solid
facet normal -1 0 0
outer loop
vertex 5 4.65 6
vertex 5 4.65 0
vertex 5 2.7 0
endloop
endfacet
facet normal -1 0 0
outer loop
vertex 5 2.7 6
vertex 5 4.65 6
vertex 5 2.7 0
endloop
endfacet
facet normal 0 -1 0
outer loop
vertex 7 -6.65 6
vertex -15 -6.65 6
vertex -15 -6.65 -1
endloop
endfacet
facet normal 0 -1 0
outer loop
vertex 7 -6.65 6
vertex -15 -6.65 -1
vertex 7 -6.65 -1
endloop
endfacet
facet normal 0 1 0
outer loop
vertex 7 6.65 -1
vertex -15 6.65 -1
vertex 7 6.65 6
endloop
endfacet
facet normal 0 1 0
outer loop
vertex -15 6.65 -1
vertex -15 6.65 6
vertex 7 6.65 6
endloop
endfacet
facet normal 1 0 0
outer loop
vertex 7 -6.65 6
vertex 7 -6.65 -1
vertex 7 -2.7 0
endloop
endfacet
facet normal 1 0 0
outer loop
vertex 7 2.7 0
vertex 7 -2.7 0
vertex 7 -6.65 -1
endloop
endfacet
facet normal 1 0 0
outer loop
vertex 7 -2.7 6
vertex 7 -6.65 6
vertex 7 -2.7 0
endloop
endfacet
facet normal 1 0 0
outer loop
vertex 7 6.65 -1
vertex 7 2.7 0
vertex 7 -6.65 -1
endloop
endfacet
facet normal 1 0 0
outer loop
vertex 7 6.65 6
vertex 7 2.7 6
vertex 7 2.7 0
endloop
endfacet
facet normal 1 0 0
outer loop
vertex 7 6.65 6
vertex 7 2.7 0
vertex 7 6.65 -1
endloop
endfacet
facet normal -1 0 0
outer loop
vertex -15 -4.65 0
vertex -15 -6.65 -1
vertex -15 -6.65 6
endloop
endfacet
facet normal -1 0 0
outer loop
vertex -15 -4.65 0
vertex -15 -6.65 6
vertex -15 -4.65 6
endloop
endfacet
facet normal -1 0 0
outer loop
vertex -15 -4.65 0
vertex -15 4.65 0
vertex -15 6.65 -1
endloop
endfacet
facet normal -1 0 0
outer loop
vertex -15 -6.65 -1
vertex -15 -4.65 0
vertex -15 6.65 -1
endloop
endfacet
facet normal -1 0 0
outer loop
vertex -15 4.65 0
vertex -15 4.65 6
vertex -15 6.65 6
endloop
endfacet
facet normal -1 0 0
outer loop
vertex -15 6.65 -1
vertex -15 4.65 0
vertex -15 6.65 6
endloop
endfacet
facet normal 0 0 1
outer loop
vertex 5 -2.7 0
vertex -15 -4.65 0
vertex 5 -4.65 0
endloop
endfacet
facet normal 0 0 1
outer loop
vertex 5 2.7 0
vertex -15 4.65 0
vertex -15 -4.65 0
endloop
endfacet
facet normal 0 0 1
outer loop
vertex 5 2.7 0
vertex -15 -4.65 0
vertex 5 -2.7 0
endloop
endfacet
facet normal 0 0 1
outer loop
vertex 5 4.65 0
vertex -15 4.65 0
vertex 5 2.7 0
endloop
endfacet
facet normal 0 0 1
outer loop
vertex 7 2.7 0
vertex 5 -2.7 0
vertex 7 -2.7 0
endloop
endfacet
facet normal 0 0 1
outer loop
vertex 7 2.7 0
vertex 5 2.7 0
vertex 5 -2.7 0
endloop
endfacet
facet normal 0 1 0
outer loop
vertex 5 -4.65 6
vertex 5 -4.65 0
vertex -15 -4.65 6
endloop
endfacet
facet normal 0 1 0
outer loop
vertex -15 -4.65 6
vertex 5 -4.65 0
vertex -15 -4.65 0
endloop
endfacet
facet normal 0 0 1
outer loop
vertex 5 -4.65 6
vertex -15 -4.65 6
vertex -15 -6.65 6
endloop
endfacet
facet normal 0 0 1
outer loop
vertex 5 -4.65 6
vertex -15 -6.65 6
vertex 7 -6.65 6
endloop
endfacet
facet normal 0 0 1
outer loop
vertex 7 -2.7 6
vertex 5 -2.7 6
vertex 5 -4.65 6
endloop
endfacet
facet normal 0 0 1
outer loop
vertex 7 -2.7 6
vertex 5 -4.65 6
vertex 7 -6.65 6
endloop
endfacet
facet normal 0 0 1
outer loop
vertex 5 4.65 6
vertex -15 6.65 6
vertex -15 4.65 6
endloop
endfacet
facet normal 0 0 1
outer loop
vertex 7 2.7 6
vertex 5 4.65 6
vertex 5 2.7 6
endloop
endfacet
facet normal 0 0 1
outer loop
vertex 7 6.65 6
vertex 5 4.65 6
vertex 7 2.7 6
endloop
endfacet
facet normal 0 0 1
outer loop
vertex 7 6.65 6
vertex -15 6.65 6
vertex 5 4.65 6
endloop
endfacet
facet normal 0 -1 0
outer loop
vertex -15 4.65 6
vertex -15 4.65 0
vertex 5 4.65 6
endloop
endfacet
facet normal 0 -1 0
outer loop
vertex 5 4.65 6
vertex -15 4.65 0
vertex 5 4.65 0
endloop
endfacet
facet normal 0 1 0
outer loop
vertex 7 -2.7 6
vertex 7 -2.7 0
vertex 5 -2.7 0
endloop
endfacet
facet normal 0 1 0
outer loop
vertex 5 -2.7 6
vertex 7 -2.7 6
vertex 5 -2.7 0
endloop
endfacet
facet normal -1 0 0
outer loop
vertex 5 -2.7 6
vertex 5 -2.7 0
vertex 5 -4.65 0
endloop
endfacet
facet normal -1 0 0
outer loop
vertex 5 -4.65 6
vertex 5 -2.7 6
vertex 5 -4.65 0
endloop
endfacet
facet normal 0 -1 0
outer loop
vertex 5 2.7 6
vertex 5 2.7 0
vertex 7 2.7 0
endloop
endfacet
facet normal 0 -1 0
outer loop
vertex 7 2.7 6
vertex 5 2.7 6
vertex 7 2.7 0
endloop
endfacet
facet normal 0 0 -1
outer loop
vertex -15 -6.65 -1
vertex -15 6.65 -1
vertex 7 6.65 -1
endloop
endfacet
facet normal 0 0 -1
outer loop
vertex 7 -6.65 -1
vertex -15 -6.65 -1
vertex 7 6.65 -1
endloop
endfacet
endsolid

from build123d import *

# Parameters (mm, degrees)
F0_W     = 10
F0_H     = 2
F1_DEPTH = 6
F2_W     = 22
F2_H     = 13.3
F3_DEPTH = 1


with BuildPart() as f1:
    # F0 (on Top) → F1 (new body)
    with BuildSketch(Plane.XY):
        Polygon((-5, 4.65), (5, 4.65), (5, 2.7), (7, 2.7), (7, 4.85), (7, 6.65), (5, 6.65), (-5, 6.65), align=None)
        with Locations((-10, 5.65)):
            Rectangle(F0_W, F0_H)
    extrude(amount=F1_DEPTH)



with BuildPart() as f1b:
    # F0 (on Top) → F1, piece 2 (new body)
    with BuildSketch(Plane.XY):
        Polygon((5, -4.65), (-5, -4.65), (-5, -6.65), (5, -6.65), (7, -6.65), (7, -4.85), (7, -2.7), (5, -2.7), align=None)
        with Locations((-10, -5.65)):
            Rectangle(F0_W, F0_H)
    extrude(amount=F1_DEPTH)


with BuildPart() as f1_1:
    add(f1.part)

    add(f1b.part)  # F3 merges F1b
    # F2 (on Top) → F3 (join)
    with BuildSketch(Plane.XY):
        with Locations((-4, 0)):
            Rectangle(F2_W, F2_H)
    extrude(amount=-F3_DEPTH)


solid = f1_1.part
